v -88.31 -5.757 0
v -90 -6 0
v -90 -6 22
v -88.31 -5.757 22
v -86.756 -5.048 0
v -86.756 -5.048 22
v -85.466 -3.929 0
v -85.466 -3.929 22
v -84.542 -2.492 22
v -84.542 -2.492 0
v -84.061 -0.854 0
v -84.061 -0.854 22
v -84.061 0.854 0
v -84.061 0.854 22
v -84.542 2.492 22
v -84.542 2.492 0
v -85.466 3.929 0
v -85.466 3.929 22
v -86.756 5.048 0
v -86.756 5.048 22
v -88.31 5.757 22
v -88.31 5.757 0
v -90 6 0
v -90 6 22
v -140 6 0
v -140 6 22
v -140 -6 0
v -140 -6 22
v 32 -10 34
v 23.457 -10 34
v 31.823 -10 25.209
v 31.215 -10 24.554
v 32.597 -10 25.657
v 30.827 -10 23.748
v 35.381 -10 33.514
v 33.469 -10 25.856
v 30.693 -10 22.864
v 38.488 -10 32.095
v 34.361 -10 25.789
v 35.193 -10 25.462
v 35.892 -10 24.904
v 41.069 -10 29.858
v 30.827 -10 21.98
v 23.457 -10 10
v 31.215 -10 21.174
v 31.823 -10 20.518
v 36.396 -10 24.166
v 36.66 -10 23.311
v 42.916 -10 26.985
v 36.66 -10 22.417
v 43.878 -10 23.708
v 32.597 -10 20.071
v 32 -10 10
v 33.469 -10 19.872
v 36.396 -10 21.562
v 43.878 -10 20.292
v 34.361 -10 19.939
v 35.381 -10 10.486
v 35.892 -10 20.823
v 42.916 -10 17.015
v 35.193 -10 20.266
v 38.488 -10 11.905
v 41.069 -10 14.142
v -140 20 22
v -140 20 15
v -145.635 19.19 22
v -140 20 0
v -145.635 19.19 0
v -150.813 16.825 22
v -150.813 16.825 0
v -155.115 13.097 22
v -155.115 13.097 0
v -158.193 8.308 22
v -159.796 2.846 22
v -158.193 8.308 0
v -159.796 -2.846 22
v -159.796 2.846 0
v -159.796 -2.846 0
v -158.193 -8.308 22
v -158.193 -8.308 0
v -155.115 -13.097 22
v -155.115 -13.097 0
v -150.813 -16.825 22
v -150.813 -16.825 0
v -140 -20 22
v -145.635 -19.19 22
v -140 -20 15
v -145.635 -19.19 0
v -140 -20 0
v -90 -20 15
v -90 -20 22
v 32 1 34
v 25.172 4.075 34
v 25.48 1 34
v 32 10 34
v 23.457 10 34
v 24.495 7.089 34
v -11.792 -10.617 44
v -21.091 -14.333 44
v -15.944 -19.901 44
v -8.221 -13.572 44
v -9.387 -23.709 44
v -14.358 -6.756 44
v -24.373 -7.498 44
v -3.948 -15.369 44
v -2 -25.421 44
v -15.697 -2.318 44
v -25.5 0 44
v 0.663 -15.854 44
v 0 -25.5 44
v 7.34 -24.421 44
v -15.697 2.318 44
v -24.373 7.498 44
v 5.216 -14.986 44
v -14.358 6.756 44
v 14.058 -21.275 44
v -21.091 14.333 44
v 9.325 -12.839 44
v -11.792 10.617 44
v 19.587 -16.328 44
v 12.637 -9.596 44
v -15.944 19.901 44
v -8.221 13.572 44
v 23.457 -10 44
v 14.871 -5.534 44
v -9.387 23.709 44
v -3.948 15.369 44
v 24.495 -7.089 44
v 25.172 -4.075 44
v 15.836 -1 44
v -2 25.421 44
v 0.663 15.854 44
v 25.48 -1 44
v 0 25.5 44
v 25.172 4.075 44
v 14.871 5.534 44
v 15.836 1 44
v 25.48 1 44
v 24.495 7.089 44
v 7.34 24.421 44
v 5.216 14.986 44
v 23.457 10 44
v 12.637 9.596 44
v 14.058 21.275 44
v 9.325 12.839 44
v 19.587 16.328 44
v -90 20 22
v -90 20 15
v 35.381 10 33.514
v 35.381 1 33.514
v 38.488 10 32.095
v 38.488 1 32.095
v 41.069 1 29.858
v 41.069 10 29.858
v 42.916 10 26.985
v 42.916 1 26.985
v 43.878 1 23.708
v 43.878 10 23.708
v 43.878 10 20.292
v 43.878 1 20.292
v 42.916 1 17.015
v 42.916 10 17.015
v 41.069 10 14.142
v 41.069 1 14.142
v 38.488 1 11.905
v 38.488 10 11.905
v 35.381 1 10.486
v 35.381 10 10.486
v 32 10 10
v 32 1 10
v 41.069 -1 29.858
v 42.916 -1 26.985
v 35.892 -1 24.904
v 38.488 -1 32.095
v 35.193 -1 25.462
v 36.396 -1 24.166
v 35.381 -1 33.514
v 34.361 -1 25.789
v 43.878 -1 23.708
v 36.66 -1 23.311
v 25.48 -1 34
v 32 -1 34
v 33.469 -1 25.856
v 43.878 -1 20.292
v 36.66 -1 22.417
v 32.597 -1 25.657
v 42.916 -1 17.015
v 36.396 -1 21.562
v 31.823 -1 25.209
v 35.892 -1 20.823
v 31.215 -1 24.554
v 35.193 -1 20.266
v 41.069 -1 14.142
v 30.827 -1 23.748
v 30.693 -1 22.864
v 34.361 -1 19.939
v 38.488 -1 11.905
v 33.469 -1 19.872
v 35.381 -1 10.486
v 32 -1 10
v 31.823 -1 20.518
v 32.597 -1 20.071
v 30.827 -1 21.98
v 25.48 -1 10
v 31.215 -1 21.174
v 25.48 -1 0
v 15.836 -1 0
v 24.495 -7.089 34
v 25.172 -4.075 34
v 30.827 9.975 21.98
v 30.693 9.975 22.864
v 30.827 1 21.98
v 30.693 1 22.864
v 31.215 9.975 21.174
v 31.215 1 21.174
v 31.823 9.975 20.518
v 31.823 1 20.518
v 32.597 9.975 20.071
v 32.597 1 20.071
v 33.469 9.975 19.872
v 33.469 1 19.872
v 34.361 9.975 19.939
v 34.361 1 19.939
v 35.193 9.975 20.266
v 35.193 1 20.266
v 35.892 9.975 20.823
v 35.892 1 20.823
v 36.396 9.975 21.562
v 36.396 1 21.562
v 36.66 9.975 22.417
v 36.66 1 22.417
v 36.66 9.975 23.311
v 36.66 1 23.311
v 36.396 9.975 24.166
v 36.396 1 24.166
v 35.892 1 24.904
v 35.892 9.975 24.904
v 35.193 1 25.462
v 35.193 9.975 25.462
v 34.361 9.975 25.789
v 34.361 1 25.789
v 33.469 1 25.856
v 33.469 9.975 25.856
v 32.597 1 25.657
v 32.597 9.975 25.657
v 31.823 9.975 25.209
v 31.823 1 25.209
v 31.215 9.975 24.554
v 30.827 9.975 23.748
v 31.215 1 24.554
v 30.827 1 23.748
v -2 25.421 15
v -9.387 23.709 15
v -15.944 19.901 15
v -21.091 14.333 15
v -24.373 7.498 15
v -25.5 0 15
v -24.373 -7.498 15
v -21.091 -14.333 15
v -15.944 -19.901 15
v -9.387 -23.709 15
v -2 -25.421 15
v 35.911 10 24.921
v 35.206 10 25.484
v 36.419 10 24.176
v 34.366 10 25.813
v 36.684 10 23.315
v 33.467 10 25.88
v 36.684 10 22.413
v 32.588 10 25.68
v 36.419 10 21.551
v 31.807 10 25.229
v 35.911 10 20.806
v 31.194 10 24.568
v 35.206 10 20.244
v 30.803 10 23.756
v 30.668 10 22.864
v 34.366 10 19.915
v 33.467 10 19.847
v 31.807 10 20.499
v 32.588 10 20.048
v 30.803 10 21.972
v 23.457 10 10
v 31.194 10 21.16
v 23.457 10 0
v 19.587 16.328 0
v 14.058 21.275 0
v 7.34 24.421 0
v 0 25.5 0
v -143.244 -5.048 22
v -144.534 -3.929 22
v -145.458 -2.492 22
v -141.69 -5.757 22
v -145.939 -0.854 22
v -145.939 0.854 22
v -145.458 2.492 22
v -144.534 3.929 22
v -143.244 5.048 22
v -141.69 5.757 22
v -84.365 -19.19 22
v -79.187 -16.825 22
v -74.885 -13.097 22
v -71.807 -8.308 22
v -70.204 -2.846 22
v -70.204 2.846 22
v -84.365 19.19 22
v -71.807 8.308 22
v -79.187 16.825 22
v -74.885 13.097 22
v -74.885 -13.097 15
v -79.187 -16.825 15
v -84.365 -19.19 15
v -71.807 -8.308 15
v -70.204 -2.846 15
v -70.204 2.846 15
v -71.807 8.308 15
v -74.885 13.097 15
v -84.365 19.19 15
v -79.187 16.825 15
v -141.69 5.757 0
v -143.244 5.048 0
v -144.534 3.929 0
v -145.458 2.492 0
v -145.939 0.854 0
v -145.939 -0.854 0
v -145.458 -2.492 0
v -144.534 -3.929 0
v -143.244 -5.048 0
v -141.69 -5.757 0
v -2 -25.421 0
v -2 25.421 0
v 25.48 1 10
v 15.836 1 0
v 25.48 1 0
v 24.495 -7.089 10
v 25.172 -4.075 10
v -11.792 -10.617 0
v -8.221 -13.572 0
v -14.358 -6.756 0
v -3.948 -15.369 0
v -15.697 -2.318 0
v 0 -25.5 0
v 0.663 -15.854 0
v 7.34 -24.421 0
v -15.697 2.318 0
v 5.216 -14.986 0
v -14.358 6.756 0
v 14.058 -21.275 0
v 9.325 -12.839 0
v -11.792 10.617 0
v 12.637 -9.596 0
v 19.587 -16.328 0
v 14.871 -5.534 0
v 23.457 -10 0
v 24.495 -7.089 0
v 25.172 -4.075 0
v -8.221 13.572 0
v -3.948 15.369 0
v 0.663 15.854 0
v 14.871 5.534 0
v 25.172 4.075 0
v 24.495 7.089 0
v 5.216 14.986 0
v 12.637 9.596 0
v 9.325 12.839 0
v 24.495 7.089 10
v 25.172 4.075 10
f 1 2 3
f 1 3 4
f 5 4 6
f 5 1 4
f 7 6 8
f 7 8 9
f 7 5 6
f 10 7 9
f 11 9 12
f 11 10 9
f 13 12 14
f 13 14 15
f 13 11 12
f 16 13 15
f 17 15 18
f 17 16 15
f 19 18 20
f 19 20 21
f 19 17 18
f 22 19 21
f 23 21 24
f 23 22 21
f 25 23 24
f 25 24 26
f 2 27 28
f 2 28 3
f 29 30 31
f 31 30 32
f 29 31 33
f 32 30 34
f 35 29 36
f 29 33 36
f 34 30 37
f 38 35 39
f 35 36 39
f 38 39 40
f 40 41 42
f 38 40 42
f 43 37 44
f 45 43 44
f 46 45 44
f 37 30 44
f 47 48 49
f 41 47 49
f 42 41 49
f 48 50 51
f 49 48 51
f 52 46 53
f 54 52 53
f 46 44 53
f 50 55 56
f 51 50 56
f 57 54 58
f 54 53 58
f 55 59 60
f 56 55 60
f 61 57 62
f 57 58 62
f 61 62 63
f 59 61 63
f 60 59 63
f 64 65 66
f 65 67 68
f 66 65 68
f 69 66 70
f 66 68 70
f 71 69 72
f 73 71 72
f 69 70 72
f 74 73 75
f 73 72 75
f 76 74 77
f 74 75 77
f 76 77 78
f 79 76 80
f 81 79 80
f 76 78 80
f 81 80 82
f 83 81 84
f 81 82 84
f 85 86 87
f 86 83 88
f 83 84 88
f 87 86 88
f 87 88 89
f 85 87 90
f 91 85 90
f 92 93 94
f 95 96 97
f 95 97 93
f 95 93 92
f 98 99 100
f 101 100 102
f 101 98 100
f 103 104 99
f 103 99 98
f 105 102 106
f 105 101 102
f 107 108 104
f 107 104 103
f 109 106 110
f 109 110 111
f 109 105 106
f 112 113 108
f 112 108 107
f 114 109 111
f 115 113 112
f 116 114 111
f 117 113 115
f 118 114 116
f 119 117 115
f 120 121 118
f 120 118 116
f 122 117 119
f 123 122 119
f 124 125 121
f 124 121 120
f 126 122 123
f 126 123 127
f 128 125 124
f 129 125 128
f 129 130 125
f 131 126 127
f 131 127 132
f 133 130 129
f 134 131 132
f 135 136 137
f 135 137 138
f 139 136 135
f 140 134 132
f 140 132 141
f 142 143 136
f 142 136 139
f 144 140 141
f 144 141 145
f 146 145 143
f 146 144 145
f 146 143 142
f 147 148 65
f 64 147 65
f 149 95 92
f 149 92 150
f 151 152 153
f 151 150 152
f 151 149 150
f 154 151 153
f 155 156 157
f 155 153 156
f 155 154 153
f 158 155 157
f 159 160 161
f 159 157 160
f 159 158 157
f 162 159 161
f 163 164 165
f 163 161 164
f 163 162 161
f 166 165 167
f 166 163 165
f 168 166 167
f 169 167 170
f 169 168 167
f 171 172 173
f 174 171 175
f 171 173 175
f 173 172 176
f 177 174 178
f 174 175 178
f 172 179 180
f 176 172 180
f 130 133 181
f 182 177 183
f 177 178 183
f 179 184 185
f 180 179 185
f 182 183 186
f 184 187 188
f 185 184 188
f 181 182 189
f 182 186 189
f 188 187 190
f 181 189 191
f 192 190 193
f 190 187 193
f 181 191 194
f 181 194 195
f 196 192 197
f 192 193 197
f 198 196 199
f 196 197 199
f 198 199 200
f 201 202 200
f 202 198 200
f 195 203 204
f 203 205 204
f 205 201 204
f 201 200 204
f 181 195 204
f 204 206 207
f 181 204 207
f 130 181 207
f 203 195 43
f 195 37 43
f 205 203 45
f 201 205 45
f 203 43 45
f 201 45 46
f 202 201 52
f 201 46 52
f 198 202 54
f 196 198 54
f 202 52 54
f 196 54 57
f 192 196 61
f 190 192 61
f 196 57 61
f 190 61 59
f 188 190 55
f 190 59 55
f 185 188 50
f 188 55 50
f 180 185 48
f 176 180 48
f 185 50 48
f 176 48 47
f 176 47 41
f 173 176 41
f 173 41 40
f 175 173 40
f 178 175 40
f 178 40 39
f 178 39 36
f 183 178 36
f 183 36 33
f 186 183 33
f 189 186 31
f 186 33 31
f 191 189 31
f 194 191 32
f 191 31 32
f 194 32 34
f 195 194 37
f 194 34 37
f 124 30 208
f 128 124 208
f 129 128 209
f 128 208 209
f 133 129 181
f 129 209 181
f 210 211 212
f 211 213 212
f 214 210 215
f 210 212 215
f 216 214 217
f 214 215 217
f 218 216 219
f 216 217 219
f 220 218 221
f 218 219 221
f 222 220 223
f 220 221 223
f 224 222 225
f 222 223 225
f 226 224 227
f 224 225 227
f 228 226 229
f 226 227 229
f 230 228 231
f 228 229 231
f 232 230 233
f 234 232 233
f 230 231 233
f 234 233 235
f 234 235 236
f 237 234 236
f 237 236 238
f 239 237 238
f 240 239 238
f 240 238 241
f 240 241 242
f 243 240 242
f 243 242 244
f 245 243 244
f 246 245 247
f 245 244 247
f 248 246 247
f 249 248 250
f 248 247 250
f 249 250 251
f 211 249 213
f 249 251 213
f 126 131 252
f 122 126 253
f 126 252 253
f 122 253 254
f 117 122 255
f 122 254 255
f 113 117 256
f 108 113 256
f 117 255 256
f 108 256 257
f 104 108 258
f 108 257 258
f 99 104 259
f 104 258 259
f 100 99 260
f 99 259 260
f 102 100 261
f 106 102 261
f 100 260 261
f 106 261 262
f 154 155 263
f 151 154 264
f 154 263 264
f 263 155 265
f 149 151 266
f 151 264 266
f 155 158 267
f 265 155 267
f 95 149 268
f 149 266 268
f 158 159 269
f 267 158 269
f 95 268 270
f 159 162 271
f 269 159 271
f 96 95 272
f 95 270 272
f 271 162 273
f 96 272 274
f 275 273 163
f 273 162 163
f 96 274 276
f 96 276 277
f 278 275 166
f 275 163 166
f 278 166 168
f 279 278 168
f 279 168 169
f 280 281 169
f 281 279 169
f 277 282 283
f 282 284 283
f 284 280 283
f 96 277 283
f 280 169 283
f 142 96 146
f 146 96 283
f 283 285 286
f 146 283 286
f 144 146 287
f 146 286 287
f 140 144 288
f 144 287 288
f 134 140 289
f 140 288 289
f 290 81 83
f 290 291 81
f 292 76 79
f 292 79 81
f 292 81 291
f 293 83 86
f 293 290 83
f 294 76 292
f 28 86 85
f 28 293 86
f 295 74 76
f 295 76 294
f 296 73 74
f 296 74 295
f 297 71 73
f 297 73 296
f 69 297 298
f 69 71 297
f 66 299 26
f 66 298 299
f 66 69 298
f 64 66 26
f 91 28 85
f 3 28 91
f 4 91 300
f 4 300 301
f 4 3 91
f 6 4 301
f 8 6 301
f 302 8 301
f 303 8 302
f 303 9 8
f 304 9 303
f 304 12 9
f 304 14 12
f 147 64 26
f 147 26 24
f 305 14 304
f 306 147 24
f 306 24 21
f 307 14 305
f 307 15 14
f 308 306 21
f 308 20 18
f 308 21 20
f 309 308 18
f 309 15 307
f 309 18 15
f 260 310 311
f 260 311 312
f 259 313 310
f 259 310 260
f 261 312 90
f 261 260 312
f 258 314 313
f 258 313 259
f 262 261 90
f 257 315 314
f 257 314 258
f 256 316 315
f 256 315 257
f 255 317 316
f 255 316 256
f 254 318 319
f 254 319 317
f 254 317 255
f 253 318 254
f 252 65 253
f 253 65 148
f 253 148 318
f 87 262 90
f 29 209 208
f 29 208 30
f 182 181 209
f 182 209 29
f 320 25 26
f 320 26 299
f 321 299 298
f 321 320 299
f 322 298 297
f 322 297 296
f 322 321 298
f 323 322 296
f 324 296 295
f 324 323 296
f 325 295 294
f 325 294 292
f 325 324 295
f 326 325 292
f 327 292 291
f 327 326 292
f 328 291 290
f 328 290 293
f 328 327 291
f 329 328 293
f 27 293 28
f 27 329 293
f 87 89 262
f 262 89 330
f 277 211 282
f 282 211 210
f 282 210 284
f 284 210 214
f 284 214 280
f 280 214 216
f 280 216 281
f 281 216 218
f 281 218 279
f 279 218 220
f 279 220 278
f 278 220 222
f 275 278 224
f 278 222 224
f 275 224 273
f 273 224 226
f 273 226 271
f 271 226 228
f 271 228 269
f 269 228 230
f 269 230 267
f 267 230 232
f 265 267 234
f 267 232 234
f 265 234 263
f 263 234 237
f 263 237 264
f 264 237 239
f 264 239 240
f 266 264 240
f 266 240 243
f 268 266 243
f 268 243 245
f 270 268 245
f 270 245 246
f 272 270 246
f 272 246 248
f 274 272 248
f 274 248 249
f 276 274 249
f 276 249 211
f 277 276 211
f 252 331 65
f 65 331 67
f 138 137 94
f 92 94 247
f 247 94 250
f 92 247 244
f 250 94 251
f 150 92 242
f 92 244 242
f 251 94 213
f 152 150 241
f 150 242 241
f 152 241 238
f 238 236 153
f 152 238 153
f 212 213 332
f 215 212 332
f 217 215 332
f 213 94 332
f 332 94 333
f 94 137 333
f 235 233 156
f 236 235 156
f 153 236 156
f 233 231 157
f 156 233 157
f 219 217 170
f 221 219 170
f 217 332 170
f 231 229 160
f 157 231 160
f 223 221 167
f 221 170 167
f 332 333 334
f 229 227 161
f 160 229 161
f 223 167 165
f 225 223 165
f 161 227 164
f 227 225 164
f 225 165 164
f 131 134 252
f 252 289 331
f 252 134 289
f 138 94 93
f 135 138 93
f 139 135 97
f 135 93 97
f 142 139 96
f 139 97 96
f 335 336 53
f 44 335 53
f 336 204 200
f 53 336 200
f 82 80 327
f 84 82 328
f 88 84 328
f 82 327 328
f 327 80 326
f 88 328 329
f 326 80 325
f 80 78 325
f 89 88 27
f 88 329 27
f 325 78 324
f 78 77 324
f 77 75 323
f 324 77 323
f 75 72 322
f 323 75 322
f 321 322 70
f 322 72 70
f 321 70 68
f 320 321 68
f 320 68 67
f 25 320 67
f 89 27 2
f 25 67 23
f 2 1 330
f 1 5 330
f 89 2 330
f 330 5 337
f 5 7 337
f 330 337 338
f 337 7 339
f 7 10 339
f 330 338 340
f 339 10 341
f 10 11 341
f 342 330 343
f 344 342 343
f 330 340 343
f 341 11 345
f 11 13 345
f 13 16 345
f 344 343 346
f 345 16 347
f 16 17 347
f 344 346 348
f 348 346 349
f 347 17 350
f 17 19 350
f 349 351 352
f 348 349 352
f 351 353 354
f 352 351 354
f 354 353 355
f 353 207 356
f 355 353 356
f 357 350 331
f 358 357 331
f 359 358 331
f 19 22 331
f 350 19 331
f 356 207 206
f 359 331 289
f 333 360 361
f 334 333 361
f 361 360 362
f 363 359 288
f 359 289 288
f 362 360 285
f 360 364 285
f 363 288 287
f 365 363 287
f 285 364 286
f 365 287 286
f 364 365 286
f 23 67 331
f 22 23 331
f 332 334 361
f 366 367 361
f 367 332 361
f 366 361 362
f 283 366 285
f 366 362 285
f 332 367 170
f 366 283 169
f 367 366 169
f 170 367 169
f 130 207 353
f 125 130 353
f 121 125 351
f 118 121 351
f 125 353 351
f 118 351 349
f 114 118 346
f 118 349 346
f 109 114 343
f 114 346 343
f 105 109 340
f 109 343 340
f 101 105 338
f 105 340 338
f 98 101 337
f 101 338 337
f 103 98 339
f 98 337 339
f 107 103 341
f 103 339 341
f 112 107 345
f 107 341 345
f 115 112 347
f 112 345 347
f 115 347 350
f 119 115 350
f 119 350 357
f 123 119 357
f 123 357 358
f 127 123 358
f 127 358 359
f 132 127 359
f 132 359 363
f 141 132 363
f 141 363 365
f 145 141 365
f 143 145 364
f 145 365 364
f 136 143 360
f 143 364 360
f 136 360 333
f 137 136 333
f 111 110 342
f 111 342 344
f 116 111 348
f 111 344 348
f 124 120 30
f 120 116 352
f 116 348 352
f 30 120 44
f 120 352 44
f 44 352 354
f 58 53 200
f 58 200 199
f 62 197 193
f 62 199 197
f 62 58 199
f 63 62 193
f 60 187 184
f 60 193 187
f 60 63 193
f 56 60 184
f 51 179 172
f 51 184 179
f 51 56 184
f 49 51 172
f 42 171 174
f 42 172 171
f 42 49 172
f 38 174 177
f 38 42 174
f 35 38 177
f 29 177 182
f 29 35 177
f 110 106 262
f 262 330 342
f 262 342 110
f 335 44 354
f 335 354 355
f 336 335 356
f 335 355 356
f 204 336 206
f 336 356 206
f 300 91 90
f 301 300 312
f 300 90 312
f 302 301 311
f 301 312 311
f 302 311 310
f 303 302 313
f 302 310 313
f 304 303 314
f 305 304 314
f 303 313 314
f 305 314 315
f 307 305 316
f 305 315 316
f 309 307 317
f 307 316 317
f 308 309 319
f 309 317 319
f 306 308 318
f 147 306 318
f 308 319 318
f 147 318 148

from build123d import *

# Parameters (mm, degrees)
BOSS_EXTRUDE1_DEPTH             = 44
BOSS_EXTRUDE2_DEPTH             = 15
BOSS_EXTRUDE3_DEPTH             = 22
BOSS_EXTRUDE4_START             = 10
BOSS_EXTRUDE4_DEPTH             = 24
FILLET1_RADIUS                  = 12
FILLET1_LENGTH                  = 9
FILLET2_RADIUS                  = 12
FILLET2_LENGTH                  = 9
F_6_0MM_DOWEL_HOLE1_D           = 6
F_6_0MM_DOWEL_HOLE1_CSINK_D     = 6.05
F_6_0MM_DOWEL_HOLE1_CSINK_ANGLE = 90


with BuildPart() as part:
    # Sketch1 → Boss-Extrude1 (new body)
    with BuildSketch(Plane.XY):
        with BuildLine():
            Line((0, 25.5), (-2.000483947, 25.421409559))
            ThreePointArc((-2.000483947, 25.421409559), (-25.5, 0), (-2.000483947, -25.421409559))
            Line((-2.000483947, -25.421409559), (0, -25.5))
            ThreePointArc((0, -25.5), (14.05791592, -21.274985311), (23.457408211, -10))
            ThreePointArc((23.457408211, -10), (24.879246203, -5.592236438), (25.480384612, -1))
            Line((25.480384612, -1), (15.835957699, -1))
            ThreePointArc((15.835957699, -1), (-15.8675, 0), (15.835957699, 1))
            Line((15.835957699, 1), (25.480384612, 1))
            ThreePointArc((25.480384612, 1), (24.879246203, 5.592236438), (23.457408211, 10))
            ThreePointArc((23.457408211, 10), (14.05791592, 21.274985311), (0, 25.5))
        make_face()
    extrude(amount=BOSS_EXTRUDE1_DEPTH)

    # Sketch1<3> → Boss-Extrude2 (add)
    with BuildSketch(Plane.XY):
        with BuildLine():
            Line((-2.000483947, 25.421409559), (-140, 20))
            Line((-140, 20), (-90, 20))
            ThreePointArc((-90, 20), (-70, 0), (-90, -20))
            Line((-90, -20), (-140, -20))
            Line((-140, -20), (-2.000483947, -25.421409559))
            ThreePointArc((-2.000483947, -25.421409559), (-25.5, 0), (-2.000483947, 25.421409559))
        make_face()
    extrude(amount=BOSS_EXTRUDE2_DEPTH)

    # Sketch1<4> → Boss-Extrude3 (add)
    with BuildSketch(Plane.XY):
        with BuildLine():
            Line((-140, -20), (-90, -20))
            ThreePointArc((-90, -20), (-70, 0), (-90, 20))
            Line((-90, 20), (-140, 20))
            ThreePointArc((-140, 20), (-160, 0), (-140, -20))
        make_face()
        with BuildLine():
            ThreePointArc((-140, 6), (-146, 0), (-140, -6))
            Line((-140, -6), (-90, -6))
            ThreePointArc((-90, -6), (-84, 0), (-90, 6))
            Line((-90, 6), (-140, 6))
        make_face(mode=Mode.SUBTRACT)
    extrude(amount=BOSS_EXTRUDE3_DEPTH)

    # Sketch1<5> → Boss-Extrude4 (add)
    with BuildSketch(Plane.XY.offset(BOSS_EXTRUDE4_START)):
        with BuildLine():
            Line((44, 10), (23.457408211, 10))
            ThreePointArc((23.457408211, 10), (24.879246203, 5.592236438), (25.480384612, 1))
            Line((25.480384612, 1), (44, 1))
            Line((44, 1), (44, 10))
        make_face()
        with BuildLine():
            ThreePointArc((25.480384612, -1), (24.879246203, -5.592236438), (23.457408211, -10))
            Line((23.457408211, -10), (44, -10))
            Line((44, -10), (44, -1))
            Line((44, -1), (25.480384612, -1))
        make_face()
    extrude(amount=BOSS_EXTRUDE4_DEPTH)

    # Fillet1: full round fillet: the end face becomes a half cylinder, R = half its width
    fillet1_face = Plane((44, 5.5, 22), x_dir=(0, 1, 0), z_dir=(1, 0, 0))  # on the end face: x along it, z out of the body
    fillet1_slab = fillet1_face.offset(-FILLET1_RADIUS / 2) * Box(FILLET1_LENGTH, 2 * FILLET1_RADIUS, FILLET1_RADIUS, mode=Mode.PRIVATE)  # the body's end, R deep
    fillet1_round = Plane((32, 5.5, 22), x_dir=(1, 0, 0), z_dir=(0, 1, 0)) * Cylinder(FILLET1_RADIUS, FILLET1_LENGTH, mode=Mode.PRIVATE)  # its axis R under the face
    add(fillet1_slab - fillet1_round, mode=Mode.SUBTRACT)

    # Fillet2: full round fillet: the end face becomes a half cylinder, R = half its width
    fillet2_face = Plane((44, -5.5, 22), x_dir=(0, -1, 0), z_dir=(1, 0, 0))  # on the end face: x along it, z out of the body
    fillet2_slab = fillet2_face.offset(-FILLET2_RADIUS / 2) * Box(FILLET2_LENGTH, 2 * FILLET2_RADIUS, FILLET2_RADIUS, mode=Mode.PRIVATE)  # the body's end, R deep
    fillet2_round = Plane((32, -5.5, 22), x_dir=(1, 0, 0), z_dir=(0, -1, 0)) * Cylinder(FILLET2_RADIUS, FILLET2_LENGTH, mode=Mode.PRIVATE)  # its axis R under the face
    add(fillet2_slab - fillet2_round, mode=Mode.SUBTRACT)

    # Ø6.0mm Dowel Hole1 (through all)
    with Locations(Plane(origin=(0, 10, 0), x_dir=(1, 0, 0), z_dir=(0, 1, 0))):
        with Locations((33.693220204, -22.863908444)):
            CounterSinkHole(F_6_0MM_DOWEL_HOLE1_D / 2, F_6_0MM_DOWEL_HOLE1_CSINK_D / 2, counter_sink_angle=F_6_0MM_DOWEL_HOLE1_CSINK_ANGLE)


solid = part.part
